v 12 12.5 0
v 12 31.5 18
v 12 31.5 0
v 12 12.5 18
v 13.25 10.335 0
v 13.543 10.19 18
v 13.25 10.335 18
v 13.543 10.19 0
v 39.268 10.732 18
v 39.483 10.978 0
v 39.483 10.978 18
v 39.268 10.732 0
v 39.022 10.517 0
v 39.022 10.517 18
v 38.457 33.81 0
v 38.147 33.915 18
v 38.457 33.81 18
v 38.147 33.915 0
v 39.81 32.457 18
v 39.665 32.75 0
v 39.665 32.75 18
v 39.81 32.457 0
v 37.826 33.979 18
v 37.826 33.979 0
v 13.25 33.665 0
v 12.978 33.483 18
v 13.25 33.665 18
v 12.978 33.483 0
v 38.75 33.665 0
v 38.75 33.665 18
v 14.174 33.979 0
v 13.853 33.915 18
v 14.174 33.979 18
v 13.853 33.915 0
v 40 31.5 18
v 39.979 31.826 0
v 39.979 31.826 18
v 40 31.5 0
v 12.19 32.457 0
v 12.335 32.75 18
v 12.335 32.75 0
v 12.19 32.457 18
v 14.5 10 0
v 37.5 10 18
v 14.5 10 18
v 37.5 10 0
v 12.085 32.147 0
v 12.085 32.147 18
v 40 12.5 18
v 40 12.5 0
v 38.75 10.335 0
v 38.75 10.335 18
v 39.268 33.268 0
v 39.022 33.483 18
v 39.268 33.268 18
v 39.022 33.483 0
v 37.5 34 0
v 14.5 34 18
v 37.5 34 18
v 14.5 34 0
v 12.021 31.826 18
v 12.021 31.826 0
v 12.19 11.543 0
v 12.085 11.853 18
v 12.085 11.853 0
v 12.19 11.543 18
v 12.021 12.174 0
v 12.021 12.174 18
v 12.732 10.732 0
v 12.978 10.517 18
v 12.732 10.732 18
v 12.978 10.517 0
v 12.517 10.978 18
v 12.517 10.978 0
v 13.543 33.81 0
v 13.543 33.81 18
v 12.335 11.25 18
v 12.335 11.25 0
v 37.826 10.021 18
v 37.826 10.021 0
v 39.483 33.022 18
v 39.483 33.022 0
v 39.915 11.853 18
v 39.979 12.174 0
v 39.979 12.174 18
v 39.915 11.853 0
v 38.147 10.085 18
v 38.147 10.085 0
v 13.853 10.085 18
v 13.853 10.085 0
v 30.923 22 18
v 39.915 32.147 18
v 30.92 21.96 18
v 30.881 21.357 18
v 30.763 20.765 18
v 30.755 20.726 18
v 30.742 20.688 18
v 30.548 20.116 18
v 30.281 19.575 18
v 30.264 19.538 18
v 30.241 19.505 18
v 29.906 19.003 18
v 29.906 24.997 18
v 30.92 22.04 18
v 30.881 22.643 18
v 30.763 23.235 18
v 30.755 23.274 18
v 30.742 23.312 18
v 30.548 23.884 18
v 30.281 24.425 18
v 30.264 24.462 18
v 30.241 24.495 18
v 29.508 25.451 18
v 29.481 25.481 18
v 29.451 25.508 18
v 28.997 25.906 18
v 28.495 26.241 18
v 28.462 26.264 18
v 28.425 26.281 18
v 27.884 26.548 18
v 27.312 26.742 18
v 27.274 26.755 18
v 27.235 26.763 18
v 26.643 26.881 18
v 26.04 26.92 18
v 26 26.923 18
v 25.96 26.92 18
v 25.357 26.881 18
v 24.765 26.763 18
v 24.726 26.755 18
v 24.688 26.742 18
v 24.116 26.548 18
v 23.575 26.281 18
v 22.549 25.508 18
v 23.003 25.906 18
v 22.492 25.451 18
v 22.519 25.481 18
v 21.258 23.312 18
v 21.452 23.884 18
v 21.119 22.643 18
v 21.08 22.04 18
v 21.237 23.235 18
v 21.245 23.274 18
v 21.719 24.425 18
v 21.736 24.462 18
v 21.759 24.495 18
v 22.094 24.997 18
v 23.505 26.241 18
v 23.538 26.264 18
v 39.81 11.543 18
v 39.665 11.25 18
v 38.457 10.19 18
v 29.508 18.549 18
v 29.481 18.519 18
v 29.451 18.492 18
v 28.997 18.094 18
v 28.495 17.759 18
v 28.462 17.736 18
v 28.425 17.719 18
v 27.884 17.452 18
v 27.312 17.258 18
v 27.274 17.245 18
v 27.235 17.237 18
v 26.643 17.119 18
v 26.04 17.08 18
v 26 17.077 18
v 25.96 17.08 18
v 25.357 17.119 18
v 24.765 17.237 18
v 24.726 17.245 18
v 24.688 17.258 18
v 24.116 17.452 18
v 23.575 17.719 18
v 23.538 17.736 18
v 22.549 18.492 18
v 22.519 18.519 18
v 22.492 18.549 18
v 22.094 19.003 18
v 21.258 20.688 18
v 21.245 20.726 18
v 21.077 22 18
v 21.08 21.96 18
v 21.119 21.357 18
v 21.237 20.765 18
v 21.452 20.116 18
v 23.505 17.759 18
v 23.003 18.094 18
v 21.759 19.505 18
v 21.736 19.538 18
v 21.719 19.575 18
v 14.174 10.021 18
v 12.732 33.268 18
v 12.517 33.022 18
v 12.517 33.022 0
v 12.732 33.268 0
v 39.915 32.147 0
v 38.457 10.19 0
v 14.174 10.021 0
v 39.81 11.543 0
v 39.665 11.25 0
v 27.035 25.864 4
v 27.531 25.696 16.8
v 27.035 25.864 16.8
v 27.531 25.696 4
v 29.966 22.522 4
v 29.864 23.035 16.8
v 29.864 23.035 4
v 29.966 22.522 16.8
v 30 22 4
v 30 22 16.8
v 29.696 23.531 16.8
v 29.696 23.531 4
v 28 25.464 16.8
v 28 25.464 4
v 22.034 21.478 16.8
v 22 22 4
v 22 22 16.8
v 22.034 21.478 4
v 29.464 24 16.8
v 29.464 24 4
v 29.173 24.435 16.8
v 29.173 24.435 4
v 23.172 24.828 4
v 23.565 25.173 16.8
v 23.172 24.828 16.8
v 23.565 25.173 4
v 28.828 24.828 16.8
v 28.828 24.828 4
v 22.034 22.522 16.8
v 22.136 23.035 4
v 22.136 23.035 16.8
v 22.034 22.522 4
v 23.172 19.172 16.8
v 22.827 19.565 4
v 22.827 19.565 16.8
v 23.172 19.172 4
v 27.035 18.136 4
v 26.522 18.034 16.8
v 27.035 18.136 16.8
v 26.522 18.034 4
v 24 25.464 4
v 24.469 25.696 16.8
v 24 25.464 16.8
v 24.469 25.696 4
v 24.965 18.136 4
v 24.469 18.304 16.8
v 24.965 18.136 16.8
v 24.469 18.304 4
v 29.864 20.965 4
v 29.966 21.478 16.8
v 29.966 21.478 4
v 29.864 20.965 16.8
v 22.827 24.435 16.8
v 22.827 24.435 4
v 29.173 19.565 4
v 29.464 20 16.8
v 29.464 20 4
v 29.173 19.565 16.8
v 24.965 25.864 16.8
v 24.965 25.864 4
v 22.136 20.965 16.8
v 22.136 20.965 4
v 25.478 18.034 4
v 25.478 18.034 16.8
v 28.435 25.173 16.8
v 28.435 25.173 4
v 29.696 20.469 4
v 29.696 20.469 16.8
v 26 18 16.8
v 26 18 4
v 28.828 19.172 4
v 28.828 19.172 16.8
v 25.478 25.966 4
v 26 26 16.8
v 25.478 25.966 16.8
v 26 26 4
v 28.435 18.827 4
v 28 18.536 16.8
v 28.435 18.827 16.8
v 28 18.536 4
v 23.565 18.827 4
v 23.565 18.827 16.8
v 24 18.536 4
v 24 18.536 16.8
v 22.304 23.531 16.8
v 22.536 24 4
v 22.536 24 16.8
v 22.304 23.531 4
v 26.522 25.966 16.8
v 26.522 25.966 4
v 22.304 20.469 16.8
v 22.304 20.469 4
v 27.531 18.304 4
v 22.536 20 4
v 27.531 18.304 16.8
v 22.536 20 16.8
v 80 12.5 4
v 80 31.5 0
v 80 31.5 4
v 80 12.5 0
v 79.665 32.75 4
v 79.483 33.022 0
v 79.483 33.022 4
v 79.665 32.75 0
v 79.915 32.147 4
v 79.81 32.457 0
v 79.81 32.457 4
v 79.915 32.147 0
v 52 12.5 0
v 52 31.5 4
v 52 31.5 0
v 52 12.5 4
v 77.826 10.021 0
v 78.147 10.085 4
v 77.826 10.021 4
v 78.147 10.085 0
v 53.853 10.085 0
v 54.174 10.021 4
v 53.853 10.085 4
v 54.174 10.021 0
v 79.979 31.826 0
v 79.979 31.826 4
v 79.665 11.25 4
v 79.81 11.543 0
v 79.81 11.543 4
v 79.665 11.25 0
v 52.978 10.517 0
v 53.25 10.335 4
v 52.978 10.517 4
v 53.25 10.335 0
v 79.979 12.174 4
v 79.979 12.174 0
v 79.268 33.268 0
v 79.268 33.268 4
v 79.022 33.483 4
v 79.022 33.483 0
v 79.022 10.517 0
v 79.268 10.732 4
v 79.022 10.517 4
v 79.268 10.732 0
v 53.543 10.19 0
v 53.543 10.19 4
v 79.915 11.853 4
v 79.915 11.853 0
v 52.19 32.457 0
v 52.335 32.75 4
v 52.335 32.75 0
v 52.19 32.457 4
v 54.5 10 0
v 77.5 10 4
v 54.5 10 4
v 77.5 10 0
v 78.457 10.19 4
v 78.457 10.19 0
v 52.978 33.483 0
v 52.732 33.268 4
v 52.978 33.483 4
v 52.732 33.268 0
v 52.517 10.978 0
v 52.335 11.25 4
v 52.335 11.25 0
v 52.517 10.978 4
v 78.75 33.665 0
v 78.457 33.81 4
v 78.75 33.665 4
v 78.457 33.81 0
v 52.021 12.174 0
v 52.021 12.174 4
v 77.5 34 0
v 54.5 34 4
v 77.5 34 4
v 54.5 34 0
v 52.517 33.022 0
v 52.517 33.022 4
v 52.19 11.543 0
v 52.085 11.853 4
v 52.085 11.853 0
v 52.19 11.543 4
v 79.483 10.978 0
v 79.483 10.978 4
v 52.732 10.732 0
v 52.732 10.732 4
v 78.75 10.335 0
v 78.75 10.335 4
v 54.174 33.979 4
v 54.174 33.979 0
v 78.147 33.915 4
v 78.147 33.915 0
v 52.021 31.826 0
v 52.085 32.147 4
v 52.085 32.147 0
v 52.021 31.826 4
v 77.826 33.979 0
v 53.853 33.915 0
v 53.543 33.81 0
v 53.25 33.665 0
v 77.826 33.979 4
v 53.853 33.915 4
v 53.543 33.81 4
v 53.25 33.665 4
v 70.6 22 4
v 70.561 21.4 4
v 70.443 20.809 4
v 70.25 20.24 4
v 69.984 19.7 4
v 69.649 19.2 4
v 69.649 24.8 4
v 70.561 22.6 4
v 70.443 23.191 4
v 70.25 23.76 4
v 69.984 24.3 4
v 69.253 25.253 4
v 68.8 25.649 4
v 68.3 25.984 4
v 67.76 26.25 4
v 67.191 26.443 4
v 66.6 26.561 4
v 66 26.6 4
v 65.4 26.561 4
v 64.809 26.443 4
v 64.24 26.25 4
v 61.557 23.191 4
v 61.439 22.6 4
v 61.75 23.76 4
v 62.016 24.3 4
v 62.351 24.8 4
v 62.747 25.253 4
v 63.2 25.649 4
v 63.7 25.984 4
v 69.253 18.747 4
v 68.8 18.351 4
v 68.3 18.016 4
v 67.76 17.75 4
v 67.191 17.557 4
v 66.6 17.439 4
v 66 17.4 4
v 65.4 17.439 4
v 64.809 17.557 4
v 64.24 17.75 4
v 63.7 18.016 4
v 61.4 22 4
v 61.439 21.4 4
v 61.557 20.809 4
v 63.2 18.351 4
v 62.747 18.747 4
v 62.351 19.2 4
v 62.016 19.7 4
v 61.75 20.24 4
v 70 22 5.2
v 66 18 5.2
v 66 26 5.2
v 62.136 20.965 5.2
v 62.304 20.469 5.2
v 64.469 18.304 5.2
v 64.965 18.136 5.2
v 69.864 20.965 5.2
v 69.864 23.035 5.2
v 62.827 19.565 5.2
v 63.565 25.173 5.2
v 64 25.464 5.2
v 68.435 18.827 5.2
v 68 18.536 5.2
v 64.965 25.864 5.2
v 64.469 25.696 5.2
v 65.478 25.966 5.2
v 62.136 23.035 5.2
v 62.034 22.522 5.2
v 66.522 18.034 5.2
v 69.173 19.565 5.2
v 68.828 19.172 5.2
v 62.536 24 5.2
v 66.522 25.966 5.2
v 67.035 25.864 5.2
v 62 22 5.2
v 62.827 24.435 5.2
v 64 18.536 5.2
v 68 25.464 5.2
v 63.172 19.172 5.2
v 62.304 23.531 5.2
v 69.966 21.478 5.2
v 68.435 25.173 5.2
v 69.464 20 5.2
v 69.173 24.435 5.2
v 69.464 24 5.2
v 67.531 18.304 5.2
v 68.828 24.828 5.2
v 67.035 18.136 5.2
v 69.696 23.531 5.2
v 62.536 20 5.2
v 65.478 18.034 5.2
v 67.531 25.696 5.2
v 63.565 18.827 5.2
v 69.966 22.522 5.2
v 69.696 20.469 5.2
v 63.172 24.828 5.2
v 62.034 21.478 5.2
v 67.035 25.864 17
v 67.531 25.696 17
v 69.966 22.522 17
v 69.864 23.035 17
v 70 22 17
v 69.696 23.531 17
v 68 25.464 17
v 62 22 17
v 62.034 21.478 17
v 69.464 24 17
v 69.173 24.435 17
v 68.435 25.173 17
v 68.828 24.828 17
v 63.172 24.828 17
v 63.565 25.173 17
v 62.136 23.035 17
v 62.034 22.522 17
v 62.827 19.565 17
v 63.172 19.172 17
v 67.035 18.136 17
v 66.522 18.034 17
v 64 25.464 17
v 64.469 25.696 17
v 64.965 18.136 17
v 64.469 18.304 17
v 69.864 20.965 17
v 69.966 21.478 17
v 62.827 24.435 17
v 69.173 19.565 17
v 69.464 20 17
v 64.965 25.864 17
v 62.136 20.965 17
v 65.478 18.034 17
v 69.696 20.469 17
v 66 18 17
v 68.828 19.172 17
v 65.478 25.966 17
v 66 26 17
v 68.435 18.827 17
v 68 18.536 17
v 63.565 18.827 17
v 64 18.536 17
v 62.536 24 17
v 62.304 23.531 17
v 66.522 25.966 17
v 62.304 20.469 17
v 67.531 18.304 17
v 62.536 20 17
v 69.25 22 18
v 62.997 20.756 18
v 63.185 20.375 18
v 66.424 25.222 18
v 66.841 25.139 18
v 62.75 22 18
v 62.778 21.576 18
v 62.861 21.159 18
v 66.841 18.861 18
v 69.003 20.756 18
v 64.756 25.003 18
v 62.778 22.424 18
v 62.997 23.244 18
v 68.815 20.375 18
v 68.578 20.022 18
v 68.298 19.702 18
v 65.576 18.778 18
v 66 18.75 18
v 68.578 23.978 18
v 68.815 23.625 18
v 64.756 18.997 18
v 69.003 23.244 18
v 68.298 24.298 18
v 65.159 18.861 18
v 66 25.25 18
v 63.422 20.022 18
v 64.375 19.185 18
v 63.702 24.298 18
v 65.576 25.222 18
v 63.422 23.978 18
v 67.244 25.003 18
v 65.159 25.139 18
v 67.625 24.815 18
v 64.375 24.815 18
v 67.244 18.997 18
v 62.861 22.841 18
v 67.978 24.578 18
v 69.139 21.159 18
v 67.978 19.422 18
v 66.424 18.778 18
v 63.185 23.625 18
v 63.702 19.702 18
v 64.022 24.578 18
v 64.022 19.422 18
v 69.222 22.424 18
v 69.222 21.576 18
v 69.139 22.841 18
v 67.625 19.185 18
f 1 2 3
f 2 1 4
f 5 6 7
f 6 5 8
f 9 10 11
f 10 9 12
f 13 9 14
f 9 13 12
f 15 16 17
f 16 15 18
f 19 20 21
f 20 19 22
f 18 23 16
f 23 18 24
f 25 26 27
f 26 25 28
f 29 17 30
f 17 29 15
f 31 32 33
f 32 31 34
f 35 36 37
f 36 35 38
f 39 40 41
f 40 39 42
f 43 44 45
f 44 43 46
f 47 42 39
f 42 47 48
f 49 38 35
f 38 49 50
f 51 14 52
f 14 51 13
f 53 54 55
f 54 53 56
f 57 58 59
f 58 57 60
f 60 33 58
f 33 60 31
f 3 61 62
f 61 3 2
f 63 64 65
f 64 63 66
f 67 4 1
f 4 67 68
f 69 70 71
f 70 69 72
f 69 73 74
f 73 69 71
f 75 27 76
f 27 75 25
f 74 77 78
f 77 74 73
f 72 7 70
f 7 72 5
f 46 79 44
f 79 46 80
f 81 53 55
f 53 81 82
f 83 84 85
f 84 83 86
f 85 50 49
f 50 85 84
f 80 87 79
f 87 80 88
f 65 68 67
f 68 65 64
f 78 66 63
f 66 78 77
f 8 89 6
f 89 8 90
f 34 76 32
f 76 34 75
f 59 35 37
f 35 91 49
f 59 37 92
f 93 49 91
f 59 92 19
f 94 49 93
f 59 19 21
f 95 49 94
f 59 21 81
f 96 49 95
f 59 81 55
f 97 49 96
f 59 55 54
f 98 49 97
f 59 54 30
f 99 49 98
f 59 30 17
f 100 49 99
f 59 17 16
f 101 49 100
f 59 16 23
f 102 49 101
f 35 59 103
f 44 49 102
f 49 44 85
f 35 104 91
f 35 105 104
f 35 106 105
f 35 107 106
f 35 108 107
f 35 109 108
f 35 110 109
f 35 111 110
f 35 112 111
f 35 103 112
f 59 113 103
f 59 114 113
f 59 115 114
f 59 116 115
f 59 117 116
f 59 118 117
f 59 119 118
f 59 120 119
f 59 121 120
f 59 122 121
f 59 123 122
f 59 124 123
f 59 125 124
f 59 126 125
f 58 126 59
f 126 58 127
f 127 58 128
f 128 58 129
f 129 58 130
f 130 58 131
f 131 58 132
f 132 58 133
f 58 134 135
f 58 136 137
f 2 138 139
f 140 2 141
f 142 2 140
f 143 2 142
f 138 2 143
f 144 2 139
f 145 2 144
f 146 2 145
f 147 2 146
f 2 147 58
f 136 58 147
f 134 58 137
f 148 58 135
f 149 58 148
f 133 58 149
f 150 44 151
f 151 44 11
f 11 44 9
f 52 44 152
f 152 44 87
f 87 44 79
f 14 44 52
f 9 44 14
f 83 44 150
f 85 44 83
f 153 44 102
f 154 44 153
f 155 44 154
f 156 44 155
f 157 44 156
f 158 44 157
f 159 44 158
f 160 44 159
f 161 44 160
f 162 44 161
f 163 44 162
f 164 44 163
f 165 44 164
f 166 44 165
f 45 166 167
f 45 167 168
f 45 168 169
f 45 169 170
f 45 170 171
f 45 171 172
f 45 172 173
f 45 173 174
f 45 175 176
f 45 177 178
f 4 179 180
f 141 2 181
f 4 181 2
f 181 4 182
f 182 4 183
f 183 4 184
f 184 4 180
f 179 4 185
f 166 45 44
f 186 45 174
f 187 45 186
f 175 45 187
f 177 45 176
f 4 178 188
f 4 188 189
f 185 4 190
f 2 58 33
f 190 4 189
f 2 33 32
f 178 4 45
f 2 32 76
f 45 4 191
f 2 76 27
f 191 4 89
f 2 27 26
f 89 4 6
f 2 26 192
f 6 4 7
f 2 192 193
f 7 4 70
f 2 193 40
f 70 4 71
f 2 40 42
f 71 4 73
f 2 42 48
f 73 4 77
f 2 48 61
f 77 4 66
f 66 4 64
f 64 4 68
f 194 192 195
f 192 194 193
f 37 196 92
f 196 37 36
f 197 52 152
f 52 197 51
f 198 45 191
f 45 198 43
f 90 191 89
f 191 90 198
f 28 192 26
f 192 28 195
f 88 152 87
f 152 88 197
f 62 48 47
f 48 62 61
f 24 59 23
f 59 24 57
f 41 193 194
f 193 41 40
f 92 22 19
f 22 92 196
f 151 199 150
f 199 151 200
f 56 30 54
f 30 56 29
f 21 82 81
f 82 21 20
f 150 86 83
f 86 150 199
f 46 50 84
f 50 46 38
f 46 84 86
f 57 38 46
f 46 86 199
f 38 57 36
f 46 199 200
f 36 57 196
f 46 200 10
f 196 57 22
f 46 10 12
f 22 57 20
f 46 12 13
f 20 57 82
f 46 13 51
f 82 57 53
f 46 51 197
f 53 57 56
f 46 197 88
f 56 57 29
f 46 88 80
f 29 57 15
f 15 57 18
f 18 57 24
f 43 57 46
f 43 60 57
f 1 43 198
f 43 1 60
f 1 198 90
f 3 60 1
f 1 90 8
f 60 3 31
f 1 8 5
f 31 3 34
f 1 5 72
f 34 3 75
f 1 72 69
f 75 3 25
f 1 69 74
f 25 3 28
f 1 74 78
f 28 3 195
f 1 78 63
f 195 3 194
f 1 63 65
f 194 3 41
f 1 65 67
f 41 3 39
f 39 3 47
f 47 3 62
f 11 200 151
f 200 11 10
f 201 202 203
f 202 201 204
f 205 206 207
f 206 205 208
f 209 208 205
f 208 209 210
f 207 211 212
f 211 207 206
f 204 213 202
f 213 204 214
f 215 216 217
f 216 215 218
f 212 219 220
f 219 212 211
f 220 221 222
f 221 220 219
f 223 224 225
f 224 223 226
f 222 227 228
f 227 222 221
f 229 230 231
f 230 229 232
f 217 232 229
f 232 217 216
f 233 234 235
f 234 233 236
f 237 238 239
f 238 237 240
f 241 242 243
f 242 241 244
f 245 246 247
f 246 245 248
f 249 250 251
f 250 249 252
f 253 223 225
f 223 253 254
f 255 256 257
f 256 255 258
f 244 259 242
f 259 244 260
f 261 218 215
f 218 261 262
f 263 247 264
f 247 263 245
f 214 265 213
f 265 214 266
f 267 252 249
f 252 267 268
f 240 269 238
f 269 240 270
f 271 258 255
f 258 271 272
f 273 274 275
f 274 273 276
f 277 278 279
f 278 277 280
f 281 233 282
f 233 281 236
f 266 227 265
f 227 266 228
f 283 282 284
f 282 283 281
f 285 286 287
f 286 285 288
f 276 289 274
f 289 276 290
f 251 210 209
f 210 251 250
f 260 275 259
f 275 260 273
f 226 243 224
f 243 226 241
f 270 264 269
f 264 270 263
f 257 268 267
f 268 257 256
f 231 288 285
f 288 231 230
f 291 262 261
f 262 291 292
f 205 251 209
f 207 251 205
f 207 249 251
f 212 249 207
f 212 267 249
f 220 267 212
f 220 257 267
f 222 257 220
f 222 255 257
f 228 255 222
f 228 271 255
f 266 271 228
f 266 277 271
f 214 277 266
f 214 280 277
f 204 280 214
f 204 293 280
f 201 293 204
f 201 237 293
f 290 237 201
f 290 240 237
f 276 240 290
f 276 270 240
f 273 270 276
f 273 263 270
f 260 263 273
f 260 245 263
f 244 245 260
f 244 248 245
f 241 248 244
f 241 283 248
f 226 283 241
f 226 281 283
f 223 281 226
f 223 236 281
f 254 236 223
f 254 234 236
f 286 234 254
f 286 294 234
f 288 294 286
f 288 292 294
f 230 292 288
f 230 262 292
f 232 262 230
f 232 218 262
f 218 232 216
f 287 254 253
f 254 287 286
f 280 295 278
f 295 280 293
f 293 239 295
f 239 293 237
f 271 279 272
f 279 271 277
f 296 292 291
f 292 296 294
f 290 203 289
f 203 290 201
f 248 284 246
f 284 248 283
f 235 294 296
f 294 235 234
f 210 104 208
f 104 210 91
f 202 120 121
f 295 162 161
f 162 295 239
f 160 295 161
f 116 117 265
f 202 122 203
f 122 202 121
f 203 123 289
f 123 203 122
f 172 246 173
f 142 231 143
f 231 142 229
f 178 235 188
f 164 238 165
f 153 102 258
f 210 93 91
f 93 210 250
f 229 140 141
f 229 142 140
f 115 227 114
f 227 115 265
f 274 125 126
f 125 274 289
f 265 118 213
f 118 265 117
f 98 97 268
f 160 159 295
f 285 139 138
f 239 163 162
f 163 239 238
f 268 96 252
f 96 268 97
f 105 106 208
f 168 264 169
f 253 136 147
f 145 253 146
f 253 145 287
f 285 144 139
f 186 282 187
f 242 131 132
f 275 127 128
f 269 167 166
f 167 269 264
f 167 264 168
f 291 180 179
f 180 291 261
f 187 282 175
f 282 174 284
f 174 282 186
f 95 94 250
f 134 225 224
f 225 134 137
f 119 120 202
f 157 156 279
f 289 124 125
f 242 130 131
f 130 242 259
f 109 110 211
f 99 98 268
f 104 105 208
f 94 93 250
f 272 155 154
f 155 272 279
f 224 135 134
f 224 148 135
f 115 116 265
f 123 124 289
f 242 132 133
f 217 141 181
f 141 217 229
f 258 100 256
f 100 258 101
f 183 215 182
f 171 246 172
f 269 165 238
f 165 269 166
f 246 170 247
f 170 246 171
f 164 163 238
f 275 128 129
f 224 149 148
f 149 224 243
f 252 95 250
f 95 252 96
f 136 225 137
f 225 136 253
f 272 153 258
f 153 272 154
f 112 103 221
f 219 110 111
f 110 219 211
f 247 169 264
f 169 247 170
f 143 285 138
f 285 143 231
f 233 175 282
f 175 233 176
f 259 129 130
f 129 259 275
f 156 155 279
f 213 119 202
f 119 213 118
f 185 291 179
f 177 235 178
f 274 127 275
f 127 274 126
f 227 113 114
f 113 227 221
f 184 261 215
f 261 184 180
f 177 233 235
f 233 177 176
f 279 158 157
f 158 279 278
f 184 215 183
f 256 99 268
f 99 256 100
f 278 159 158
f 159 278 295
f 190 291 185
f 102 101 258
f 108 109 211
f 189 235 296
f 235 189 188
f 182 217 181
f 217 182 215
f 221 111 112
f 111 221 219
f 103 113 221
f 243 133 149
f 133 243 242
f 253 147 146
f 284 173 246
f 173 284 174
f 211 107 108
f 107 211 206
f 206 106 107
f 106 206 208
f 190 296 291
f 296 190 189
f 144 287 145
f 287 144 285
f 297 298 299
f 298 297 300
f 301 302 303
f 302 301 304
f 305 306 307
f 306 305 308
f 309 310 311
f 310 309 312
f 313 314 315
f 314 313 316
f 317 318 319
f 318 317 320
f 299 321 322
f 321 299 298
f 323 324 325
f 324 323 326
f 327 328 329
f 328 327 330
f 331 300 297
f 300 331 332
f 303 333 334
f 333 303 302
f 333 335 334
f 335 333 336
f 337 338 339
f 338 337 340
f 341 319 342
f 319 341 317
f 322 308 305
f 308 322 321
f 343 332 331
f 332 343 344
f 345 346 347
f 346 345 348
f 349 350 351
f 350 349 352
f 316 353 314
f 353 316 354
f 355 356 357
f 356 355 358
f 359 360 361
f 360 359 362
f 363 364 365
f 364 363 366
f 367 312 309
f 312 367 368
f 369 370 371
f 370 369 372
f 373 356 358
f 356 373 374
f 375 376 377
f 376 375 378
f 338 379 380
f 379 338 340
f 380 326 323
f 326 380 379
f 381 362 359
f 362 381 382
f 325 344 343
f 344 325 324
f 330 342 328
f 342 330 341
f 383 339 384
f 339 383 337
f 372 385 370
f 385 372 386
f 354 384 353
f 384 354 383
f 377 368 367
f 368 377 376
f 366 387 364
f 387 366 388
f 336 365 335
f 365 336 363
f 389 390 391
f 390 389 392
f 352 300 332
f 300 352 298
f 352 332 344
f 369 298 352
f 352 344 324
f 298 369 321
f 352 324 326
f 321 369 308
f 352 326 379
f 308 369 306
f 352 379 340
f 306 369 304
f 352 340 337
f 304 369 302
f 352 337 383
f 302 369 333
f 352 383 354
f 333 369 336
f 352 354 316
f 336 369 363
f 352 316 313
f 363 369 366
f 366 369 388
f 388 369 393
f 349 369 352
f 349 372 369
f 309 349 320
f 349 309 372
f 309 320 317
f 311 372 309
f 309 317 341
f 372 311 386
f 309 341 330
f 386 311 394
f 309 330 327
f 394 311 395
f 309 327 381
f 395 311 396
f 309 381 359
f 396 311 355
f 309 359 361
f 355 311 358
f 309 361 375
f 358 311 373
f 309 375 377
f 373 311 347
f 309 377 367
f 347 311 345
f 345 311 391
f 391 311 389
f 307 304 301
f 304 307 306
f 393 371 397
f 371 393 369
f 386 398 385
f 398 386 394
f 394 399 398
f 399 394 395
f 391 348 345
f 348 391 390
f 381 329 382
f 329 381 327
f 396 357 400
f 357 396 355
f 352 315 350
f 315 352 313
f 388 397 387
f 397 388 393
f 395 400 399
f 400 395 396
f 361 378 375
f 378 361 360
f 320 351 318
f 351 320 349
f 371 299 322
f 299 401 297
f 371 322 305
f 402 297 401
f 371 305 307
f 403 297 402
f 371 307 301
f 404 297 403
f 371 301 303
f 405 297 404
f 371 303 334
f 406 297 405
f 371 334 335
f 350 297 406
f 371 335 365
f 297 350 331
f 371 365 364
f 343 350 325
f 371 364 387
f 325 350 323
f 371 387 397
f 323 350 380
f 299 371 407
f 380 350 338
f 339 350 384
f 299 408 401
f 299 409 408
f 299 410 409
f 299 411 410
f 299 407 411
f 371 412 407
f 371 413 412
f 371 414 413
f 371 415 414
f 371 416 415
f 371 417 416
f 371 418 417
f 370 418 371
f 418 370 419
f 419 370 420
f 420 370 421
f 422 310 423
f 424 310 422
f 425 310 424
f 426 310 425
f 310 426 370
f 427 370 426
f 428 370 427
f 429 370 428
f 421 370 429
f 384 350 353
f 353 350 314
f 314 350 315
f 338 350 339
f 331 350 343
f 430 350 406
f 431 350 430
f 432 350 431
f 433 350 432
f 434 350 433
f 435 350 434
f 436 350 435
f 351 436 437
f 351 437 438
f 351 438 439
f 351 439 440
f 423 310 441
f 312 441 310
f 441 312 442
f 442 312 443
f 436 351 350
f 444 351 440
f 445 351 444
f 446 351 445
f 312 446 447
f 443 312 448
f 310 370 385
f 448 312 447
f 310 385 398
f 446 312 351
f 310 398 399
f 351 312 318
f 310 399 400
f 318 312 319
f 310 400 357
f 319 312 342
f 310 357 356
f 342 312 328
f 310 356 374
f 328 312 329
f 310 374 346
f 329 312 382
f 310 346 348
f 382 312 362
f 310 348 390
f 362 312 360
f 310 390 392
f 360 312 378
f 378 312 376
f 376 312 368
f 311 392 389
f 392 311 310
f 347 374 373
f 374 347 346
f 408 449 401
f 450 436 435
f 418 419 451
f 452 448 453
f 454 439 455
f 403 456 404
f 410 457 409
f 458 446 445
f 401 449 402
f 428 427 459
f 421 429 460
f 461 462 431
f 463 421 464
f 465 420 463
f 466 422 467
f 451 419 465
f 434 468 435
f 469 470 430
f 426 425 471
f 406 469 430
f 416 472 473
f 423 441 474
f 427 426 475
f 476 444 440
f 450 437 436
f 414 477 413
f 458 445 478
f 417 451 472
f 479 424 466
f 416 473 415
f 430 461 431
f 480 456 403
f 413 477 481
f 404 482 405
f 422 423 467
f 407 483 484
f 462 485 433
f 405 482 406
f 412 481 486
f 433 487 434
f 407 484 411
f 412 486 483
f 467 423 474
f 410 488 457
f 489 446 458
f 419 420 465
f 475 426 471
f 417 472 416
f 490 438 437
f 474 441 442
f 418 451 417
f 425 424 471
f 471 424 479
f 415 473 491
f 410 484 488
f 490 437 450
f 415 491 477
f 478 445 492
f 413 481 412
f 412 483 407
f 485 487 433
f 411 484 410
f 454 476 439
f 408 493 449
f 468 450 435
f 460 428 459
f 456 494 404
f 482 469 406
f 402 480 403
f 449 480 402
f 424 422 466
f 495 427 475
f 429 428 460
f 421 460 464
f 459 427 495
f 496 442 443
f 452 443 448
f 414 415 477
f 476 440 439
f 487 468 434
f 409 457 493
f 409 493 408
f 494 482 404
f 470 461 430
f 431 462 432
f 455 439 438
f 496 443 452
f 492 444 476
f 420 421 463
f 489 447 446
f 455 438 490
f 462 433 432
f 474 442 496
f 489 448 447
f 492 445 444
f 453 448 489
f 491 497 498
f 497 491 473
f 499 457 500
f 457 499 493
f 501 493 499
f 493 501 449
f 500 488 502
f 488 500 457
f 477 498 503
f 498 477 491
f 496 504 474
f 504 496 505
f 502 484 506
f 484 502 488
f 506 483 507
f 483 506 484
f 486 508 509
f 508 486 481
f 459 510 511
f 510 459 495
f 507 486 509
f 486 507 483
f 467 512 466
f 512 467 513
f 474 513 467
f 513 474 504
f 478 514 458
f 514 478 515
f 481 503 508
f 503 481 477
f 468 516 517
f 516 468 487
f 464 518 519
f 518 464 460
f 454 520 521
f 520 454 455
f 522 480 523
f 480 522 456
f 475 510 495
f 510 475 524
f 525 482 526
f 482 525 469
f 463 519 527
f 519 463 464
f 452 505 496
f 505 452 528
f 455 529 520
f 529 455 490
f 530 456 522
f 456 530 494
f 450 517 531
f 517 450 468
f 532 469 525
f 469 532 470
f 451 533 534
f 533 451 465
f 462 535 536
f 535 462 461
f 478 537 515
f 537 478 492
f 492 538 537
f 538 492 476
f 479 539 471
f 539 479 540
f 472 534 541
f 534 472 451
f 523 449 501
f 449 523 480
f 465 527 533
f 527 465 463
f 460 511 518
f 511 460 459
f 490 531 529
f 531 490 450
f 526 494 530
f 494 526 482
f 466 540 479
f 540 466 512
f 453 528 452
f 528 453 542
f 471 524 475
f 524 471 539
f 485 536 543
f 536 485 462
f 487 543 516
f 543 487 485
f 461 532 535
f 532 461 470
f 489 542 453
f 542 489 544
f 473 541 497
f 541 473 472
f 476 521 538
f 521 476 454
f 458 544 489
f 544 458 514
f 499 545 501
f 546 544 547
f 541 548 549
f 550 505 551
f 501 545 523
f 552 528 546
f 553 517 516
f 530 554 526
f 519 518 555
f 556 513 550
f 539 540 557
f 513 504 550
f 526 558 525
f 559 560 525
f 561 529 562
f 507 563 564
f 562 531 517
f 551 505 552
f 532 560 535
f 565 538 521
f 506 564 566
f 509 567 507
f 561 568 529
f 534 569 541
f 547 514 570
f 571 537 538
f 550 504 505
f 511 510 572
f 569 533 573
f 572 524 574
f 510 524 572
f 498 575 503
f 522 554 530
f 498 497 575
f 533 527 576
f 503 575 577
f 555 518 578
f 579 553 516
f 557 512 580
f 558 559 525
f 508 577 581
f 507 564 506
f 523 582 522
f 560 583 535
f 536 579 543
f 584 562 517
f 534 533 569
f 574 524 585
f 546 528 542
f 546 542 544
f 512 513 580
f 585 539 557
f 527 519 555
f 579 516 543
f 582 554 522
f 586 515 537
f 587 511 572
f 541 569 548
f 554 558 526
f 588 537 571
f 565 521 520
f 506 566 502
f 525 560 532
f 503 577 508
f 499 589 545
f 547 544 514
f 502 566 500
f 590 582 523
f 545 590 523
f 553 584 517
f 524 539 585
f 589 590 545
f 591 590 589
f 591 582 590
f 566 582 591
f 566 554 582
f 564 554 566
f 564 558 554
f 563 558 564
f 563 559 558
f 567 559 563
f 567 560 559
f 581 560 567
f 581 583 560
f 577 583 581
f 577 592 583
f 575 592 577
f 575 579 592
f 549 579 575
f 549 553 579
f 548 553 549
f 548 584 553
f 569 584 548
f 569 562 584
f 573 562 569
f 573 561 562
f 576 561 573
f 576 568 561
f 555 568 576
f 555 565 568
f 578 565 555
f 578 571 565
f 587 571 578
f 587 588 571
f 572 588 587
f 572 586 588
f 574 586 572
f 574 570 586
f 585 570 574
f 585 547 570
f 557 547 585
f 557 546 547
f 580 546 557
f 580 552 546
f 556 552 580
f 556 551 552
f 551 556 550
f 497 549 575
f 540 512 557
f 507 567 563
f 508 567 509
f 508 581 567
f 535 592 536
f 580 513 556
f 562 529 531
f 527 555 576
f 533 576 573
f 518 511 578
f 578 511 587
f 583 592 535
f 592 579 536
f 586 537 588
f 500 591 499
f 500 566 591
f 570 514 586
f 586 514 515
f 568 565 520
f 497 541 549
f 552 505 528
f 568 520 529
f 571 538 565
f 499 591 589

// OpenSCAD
/*
Sample 039: Dauerhafter Pressstift — Nennmaß
Generated from the FDM Mechanical Sample Library.
Units: millimetres.

Override examples:
  openscad -o custom.stl -D 'view="plate"' -D 'render_fn=64' model.scad
  openscad -o preview.png -D 'view="assembly"' model.scad
*/
use <../../../library/fdm_mechanisms.scad>

render_fn = is_undef(render_fn) ? 48 : render_fn;
view = is_undef(view) ? "plate" : view;
$fn = render_fn;

sample_pressfit_dowel(
    view=view,
    pin_d=8,
    gap=0
);
